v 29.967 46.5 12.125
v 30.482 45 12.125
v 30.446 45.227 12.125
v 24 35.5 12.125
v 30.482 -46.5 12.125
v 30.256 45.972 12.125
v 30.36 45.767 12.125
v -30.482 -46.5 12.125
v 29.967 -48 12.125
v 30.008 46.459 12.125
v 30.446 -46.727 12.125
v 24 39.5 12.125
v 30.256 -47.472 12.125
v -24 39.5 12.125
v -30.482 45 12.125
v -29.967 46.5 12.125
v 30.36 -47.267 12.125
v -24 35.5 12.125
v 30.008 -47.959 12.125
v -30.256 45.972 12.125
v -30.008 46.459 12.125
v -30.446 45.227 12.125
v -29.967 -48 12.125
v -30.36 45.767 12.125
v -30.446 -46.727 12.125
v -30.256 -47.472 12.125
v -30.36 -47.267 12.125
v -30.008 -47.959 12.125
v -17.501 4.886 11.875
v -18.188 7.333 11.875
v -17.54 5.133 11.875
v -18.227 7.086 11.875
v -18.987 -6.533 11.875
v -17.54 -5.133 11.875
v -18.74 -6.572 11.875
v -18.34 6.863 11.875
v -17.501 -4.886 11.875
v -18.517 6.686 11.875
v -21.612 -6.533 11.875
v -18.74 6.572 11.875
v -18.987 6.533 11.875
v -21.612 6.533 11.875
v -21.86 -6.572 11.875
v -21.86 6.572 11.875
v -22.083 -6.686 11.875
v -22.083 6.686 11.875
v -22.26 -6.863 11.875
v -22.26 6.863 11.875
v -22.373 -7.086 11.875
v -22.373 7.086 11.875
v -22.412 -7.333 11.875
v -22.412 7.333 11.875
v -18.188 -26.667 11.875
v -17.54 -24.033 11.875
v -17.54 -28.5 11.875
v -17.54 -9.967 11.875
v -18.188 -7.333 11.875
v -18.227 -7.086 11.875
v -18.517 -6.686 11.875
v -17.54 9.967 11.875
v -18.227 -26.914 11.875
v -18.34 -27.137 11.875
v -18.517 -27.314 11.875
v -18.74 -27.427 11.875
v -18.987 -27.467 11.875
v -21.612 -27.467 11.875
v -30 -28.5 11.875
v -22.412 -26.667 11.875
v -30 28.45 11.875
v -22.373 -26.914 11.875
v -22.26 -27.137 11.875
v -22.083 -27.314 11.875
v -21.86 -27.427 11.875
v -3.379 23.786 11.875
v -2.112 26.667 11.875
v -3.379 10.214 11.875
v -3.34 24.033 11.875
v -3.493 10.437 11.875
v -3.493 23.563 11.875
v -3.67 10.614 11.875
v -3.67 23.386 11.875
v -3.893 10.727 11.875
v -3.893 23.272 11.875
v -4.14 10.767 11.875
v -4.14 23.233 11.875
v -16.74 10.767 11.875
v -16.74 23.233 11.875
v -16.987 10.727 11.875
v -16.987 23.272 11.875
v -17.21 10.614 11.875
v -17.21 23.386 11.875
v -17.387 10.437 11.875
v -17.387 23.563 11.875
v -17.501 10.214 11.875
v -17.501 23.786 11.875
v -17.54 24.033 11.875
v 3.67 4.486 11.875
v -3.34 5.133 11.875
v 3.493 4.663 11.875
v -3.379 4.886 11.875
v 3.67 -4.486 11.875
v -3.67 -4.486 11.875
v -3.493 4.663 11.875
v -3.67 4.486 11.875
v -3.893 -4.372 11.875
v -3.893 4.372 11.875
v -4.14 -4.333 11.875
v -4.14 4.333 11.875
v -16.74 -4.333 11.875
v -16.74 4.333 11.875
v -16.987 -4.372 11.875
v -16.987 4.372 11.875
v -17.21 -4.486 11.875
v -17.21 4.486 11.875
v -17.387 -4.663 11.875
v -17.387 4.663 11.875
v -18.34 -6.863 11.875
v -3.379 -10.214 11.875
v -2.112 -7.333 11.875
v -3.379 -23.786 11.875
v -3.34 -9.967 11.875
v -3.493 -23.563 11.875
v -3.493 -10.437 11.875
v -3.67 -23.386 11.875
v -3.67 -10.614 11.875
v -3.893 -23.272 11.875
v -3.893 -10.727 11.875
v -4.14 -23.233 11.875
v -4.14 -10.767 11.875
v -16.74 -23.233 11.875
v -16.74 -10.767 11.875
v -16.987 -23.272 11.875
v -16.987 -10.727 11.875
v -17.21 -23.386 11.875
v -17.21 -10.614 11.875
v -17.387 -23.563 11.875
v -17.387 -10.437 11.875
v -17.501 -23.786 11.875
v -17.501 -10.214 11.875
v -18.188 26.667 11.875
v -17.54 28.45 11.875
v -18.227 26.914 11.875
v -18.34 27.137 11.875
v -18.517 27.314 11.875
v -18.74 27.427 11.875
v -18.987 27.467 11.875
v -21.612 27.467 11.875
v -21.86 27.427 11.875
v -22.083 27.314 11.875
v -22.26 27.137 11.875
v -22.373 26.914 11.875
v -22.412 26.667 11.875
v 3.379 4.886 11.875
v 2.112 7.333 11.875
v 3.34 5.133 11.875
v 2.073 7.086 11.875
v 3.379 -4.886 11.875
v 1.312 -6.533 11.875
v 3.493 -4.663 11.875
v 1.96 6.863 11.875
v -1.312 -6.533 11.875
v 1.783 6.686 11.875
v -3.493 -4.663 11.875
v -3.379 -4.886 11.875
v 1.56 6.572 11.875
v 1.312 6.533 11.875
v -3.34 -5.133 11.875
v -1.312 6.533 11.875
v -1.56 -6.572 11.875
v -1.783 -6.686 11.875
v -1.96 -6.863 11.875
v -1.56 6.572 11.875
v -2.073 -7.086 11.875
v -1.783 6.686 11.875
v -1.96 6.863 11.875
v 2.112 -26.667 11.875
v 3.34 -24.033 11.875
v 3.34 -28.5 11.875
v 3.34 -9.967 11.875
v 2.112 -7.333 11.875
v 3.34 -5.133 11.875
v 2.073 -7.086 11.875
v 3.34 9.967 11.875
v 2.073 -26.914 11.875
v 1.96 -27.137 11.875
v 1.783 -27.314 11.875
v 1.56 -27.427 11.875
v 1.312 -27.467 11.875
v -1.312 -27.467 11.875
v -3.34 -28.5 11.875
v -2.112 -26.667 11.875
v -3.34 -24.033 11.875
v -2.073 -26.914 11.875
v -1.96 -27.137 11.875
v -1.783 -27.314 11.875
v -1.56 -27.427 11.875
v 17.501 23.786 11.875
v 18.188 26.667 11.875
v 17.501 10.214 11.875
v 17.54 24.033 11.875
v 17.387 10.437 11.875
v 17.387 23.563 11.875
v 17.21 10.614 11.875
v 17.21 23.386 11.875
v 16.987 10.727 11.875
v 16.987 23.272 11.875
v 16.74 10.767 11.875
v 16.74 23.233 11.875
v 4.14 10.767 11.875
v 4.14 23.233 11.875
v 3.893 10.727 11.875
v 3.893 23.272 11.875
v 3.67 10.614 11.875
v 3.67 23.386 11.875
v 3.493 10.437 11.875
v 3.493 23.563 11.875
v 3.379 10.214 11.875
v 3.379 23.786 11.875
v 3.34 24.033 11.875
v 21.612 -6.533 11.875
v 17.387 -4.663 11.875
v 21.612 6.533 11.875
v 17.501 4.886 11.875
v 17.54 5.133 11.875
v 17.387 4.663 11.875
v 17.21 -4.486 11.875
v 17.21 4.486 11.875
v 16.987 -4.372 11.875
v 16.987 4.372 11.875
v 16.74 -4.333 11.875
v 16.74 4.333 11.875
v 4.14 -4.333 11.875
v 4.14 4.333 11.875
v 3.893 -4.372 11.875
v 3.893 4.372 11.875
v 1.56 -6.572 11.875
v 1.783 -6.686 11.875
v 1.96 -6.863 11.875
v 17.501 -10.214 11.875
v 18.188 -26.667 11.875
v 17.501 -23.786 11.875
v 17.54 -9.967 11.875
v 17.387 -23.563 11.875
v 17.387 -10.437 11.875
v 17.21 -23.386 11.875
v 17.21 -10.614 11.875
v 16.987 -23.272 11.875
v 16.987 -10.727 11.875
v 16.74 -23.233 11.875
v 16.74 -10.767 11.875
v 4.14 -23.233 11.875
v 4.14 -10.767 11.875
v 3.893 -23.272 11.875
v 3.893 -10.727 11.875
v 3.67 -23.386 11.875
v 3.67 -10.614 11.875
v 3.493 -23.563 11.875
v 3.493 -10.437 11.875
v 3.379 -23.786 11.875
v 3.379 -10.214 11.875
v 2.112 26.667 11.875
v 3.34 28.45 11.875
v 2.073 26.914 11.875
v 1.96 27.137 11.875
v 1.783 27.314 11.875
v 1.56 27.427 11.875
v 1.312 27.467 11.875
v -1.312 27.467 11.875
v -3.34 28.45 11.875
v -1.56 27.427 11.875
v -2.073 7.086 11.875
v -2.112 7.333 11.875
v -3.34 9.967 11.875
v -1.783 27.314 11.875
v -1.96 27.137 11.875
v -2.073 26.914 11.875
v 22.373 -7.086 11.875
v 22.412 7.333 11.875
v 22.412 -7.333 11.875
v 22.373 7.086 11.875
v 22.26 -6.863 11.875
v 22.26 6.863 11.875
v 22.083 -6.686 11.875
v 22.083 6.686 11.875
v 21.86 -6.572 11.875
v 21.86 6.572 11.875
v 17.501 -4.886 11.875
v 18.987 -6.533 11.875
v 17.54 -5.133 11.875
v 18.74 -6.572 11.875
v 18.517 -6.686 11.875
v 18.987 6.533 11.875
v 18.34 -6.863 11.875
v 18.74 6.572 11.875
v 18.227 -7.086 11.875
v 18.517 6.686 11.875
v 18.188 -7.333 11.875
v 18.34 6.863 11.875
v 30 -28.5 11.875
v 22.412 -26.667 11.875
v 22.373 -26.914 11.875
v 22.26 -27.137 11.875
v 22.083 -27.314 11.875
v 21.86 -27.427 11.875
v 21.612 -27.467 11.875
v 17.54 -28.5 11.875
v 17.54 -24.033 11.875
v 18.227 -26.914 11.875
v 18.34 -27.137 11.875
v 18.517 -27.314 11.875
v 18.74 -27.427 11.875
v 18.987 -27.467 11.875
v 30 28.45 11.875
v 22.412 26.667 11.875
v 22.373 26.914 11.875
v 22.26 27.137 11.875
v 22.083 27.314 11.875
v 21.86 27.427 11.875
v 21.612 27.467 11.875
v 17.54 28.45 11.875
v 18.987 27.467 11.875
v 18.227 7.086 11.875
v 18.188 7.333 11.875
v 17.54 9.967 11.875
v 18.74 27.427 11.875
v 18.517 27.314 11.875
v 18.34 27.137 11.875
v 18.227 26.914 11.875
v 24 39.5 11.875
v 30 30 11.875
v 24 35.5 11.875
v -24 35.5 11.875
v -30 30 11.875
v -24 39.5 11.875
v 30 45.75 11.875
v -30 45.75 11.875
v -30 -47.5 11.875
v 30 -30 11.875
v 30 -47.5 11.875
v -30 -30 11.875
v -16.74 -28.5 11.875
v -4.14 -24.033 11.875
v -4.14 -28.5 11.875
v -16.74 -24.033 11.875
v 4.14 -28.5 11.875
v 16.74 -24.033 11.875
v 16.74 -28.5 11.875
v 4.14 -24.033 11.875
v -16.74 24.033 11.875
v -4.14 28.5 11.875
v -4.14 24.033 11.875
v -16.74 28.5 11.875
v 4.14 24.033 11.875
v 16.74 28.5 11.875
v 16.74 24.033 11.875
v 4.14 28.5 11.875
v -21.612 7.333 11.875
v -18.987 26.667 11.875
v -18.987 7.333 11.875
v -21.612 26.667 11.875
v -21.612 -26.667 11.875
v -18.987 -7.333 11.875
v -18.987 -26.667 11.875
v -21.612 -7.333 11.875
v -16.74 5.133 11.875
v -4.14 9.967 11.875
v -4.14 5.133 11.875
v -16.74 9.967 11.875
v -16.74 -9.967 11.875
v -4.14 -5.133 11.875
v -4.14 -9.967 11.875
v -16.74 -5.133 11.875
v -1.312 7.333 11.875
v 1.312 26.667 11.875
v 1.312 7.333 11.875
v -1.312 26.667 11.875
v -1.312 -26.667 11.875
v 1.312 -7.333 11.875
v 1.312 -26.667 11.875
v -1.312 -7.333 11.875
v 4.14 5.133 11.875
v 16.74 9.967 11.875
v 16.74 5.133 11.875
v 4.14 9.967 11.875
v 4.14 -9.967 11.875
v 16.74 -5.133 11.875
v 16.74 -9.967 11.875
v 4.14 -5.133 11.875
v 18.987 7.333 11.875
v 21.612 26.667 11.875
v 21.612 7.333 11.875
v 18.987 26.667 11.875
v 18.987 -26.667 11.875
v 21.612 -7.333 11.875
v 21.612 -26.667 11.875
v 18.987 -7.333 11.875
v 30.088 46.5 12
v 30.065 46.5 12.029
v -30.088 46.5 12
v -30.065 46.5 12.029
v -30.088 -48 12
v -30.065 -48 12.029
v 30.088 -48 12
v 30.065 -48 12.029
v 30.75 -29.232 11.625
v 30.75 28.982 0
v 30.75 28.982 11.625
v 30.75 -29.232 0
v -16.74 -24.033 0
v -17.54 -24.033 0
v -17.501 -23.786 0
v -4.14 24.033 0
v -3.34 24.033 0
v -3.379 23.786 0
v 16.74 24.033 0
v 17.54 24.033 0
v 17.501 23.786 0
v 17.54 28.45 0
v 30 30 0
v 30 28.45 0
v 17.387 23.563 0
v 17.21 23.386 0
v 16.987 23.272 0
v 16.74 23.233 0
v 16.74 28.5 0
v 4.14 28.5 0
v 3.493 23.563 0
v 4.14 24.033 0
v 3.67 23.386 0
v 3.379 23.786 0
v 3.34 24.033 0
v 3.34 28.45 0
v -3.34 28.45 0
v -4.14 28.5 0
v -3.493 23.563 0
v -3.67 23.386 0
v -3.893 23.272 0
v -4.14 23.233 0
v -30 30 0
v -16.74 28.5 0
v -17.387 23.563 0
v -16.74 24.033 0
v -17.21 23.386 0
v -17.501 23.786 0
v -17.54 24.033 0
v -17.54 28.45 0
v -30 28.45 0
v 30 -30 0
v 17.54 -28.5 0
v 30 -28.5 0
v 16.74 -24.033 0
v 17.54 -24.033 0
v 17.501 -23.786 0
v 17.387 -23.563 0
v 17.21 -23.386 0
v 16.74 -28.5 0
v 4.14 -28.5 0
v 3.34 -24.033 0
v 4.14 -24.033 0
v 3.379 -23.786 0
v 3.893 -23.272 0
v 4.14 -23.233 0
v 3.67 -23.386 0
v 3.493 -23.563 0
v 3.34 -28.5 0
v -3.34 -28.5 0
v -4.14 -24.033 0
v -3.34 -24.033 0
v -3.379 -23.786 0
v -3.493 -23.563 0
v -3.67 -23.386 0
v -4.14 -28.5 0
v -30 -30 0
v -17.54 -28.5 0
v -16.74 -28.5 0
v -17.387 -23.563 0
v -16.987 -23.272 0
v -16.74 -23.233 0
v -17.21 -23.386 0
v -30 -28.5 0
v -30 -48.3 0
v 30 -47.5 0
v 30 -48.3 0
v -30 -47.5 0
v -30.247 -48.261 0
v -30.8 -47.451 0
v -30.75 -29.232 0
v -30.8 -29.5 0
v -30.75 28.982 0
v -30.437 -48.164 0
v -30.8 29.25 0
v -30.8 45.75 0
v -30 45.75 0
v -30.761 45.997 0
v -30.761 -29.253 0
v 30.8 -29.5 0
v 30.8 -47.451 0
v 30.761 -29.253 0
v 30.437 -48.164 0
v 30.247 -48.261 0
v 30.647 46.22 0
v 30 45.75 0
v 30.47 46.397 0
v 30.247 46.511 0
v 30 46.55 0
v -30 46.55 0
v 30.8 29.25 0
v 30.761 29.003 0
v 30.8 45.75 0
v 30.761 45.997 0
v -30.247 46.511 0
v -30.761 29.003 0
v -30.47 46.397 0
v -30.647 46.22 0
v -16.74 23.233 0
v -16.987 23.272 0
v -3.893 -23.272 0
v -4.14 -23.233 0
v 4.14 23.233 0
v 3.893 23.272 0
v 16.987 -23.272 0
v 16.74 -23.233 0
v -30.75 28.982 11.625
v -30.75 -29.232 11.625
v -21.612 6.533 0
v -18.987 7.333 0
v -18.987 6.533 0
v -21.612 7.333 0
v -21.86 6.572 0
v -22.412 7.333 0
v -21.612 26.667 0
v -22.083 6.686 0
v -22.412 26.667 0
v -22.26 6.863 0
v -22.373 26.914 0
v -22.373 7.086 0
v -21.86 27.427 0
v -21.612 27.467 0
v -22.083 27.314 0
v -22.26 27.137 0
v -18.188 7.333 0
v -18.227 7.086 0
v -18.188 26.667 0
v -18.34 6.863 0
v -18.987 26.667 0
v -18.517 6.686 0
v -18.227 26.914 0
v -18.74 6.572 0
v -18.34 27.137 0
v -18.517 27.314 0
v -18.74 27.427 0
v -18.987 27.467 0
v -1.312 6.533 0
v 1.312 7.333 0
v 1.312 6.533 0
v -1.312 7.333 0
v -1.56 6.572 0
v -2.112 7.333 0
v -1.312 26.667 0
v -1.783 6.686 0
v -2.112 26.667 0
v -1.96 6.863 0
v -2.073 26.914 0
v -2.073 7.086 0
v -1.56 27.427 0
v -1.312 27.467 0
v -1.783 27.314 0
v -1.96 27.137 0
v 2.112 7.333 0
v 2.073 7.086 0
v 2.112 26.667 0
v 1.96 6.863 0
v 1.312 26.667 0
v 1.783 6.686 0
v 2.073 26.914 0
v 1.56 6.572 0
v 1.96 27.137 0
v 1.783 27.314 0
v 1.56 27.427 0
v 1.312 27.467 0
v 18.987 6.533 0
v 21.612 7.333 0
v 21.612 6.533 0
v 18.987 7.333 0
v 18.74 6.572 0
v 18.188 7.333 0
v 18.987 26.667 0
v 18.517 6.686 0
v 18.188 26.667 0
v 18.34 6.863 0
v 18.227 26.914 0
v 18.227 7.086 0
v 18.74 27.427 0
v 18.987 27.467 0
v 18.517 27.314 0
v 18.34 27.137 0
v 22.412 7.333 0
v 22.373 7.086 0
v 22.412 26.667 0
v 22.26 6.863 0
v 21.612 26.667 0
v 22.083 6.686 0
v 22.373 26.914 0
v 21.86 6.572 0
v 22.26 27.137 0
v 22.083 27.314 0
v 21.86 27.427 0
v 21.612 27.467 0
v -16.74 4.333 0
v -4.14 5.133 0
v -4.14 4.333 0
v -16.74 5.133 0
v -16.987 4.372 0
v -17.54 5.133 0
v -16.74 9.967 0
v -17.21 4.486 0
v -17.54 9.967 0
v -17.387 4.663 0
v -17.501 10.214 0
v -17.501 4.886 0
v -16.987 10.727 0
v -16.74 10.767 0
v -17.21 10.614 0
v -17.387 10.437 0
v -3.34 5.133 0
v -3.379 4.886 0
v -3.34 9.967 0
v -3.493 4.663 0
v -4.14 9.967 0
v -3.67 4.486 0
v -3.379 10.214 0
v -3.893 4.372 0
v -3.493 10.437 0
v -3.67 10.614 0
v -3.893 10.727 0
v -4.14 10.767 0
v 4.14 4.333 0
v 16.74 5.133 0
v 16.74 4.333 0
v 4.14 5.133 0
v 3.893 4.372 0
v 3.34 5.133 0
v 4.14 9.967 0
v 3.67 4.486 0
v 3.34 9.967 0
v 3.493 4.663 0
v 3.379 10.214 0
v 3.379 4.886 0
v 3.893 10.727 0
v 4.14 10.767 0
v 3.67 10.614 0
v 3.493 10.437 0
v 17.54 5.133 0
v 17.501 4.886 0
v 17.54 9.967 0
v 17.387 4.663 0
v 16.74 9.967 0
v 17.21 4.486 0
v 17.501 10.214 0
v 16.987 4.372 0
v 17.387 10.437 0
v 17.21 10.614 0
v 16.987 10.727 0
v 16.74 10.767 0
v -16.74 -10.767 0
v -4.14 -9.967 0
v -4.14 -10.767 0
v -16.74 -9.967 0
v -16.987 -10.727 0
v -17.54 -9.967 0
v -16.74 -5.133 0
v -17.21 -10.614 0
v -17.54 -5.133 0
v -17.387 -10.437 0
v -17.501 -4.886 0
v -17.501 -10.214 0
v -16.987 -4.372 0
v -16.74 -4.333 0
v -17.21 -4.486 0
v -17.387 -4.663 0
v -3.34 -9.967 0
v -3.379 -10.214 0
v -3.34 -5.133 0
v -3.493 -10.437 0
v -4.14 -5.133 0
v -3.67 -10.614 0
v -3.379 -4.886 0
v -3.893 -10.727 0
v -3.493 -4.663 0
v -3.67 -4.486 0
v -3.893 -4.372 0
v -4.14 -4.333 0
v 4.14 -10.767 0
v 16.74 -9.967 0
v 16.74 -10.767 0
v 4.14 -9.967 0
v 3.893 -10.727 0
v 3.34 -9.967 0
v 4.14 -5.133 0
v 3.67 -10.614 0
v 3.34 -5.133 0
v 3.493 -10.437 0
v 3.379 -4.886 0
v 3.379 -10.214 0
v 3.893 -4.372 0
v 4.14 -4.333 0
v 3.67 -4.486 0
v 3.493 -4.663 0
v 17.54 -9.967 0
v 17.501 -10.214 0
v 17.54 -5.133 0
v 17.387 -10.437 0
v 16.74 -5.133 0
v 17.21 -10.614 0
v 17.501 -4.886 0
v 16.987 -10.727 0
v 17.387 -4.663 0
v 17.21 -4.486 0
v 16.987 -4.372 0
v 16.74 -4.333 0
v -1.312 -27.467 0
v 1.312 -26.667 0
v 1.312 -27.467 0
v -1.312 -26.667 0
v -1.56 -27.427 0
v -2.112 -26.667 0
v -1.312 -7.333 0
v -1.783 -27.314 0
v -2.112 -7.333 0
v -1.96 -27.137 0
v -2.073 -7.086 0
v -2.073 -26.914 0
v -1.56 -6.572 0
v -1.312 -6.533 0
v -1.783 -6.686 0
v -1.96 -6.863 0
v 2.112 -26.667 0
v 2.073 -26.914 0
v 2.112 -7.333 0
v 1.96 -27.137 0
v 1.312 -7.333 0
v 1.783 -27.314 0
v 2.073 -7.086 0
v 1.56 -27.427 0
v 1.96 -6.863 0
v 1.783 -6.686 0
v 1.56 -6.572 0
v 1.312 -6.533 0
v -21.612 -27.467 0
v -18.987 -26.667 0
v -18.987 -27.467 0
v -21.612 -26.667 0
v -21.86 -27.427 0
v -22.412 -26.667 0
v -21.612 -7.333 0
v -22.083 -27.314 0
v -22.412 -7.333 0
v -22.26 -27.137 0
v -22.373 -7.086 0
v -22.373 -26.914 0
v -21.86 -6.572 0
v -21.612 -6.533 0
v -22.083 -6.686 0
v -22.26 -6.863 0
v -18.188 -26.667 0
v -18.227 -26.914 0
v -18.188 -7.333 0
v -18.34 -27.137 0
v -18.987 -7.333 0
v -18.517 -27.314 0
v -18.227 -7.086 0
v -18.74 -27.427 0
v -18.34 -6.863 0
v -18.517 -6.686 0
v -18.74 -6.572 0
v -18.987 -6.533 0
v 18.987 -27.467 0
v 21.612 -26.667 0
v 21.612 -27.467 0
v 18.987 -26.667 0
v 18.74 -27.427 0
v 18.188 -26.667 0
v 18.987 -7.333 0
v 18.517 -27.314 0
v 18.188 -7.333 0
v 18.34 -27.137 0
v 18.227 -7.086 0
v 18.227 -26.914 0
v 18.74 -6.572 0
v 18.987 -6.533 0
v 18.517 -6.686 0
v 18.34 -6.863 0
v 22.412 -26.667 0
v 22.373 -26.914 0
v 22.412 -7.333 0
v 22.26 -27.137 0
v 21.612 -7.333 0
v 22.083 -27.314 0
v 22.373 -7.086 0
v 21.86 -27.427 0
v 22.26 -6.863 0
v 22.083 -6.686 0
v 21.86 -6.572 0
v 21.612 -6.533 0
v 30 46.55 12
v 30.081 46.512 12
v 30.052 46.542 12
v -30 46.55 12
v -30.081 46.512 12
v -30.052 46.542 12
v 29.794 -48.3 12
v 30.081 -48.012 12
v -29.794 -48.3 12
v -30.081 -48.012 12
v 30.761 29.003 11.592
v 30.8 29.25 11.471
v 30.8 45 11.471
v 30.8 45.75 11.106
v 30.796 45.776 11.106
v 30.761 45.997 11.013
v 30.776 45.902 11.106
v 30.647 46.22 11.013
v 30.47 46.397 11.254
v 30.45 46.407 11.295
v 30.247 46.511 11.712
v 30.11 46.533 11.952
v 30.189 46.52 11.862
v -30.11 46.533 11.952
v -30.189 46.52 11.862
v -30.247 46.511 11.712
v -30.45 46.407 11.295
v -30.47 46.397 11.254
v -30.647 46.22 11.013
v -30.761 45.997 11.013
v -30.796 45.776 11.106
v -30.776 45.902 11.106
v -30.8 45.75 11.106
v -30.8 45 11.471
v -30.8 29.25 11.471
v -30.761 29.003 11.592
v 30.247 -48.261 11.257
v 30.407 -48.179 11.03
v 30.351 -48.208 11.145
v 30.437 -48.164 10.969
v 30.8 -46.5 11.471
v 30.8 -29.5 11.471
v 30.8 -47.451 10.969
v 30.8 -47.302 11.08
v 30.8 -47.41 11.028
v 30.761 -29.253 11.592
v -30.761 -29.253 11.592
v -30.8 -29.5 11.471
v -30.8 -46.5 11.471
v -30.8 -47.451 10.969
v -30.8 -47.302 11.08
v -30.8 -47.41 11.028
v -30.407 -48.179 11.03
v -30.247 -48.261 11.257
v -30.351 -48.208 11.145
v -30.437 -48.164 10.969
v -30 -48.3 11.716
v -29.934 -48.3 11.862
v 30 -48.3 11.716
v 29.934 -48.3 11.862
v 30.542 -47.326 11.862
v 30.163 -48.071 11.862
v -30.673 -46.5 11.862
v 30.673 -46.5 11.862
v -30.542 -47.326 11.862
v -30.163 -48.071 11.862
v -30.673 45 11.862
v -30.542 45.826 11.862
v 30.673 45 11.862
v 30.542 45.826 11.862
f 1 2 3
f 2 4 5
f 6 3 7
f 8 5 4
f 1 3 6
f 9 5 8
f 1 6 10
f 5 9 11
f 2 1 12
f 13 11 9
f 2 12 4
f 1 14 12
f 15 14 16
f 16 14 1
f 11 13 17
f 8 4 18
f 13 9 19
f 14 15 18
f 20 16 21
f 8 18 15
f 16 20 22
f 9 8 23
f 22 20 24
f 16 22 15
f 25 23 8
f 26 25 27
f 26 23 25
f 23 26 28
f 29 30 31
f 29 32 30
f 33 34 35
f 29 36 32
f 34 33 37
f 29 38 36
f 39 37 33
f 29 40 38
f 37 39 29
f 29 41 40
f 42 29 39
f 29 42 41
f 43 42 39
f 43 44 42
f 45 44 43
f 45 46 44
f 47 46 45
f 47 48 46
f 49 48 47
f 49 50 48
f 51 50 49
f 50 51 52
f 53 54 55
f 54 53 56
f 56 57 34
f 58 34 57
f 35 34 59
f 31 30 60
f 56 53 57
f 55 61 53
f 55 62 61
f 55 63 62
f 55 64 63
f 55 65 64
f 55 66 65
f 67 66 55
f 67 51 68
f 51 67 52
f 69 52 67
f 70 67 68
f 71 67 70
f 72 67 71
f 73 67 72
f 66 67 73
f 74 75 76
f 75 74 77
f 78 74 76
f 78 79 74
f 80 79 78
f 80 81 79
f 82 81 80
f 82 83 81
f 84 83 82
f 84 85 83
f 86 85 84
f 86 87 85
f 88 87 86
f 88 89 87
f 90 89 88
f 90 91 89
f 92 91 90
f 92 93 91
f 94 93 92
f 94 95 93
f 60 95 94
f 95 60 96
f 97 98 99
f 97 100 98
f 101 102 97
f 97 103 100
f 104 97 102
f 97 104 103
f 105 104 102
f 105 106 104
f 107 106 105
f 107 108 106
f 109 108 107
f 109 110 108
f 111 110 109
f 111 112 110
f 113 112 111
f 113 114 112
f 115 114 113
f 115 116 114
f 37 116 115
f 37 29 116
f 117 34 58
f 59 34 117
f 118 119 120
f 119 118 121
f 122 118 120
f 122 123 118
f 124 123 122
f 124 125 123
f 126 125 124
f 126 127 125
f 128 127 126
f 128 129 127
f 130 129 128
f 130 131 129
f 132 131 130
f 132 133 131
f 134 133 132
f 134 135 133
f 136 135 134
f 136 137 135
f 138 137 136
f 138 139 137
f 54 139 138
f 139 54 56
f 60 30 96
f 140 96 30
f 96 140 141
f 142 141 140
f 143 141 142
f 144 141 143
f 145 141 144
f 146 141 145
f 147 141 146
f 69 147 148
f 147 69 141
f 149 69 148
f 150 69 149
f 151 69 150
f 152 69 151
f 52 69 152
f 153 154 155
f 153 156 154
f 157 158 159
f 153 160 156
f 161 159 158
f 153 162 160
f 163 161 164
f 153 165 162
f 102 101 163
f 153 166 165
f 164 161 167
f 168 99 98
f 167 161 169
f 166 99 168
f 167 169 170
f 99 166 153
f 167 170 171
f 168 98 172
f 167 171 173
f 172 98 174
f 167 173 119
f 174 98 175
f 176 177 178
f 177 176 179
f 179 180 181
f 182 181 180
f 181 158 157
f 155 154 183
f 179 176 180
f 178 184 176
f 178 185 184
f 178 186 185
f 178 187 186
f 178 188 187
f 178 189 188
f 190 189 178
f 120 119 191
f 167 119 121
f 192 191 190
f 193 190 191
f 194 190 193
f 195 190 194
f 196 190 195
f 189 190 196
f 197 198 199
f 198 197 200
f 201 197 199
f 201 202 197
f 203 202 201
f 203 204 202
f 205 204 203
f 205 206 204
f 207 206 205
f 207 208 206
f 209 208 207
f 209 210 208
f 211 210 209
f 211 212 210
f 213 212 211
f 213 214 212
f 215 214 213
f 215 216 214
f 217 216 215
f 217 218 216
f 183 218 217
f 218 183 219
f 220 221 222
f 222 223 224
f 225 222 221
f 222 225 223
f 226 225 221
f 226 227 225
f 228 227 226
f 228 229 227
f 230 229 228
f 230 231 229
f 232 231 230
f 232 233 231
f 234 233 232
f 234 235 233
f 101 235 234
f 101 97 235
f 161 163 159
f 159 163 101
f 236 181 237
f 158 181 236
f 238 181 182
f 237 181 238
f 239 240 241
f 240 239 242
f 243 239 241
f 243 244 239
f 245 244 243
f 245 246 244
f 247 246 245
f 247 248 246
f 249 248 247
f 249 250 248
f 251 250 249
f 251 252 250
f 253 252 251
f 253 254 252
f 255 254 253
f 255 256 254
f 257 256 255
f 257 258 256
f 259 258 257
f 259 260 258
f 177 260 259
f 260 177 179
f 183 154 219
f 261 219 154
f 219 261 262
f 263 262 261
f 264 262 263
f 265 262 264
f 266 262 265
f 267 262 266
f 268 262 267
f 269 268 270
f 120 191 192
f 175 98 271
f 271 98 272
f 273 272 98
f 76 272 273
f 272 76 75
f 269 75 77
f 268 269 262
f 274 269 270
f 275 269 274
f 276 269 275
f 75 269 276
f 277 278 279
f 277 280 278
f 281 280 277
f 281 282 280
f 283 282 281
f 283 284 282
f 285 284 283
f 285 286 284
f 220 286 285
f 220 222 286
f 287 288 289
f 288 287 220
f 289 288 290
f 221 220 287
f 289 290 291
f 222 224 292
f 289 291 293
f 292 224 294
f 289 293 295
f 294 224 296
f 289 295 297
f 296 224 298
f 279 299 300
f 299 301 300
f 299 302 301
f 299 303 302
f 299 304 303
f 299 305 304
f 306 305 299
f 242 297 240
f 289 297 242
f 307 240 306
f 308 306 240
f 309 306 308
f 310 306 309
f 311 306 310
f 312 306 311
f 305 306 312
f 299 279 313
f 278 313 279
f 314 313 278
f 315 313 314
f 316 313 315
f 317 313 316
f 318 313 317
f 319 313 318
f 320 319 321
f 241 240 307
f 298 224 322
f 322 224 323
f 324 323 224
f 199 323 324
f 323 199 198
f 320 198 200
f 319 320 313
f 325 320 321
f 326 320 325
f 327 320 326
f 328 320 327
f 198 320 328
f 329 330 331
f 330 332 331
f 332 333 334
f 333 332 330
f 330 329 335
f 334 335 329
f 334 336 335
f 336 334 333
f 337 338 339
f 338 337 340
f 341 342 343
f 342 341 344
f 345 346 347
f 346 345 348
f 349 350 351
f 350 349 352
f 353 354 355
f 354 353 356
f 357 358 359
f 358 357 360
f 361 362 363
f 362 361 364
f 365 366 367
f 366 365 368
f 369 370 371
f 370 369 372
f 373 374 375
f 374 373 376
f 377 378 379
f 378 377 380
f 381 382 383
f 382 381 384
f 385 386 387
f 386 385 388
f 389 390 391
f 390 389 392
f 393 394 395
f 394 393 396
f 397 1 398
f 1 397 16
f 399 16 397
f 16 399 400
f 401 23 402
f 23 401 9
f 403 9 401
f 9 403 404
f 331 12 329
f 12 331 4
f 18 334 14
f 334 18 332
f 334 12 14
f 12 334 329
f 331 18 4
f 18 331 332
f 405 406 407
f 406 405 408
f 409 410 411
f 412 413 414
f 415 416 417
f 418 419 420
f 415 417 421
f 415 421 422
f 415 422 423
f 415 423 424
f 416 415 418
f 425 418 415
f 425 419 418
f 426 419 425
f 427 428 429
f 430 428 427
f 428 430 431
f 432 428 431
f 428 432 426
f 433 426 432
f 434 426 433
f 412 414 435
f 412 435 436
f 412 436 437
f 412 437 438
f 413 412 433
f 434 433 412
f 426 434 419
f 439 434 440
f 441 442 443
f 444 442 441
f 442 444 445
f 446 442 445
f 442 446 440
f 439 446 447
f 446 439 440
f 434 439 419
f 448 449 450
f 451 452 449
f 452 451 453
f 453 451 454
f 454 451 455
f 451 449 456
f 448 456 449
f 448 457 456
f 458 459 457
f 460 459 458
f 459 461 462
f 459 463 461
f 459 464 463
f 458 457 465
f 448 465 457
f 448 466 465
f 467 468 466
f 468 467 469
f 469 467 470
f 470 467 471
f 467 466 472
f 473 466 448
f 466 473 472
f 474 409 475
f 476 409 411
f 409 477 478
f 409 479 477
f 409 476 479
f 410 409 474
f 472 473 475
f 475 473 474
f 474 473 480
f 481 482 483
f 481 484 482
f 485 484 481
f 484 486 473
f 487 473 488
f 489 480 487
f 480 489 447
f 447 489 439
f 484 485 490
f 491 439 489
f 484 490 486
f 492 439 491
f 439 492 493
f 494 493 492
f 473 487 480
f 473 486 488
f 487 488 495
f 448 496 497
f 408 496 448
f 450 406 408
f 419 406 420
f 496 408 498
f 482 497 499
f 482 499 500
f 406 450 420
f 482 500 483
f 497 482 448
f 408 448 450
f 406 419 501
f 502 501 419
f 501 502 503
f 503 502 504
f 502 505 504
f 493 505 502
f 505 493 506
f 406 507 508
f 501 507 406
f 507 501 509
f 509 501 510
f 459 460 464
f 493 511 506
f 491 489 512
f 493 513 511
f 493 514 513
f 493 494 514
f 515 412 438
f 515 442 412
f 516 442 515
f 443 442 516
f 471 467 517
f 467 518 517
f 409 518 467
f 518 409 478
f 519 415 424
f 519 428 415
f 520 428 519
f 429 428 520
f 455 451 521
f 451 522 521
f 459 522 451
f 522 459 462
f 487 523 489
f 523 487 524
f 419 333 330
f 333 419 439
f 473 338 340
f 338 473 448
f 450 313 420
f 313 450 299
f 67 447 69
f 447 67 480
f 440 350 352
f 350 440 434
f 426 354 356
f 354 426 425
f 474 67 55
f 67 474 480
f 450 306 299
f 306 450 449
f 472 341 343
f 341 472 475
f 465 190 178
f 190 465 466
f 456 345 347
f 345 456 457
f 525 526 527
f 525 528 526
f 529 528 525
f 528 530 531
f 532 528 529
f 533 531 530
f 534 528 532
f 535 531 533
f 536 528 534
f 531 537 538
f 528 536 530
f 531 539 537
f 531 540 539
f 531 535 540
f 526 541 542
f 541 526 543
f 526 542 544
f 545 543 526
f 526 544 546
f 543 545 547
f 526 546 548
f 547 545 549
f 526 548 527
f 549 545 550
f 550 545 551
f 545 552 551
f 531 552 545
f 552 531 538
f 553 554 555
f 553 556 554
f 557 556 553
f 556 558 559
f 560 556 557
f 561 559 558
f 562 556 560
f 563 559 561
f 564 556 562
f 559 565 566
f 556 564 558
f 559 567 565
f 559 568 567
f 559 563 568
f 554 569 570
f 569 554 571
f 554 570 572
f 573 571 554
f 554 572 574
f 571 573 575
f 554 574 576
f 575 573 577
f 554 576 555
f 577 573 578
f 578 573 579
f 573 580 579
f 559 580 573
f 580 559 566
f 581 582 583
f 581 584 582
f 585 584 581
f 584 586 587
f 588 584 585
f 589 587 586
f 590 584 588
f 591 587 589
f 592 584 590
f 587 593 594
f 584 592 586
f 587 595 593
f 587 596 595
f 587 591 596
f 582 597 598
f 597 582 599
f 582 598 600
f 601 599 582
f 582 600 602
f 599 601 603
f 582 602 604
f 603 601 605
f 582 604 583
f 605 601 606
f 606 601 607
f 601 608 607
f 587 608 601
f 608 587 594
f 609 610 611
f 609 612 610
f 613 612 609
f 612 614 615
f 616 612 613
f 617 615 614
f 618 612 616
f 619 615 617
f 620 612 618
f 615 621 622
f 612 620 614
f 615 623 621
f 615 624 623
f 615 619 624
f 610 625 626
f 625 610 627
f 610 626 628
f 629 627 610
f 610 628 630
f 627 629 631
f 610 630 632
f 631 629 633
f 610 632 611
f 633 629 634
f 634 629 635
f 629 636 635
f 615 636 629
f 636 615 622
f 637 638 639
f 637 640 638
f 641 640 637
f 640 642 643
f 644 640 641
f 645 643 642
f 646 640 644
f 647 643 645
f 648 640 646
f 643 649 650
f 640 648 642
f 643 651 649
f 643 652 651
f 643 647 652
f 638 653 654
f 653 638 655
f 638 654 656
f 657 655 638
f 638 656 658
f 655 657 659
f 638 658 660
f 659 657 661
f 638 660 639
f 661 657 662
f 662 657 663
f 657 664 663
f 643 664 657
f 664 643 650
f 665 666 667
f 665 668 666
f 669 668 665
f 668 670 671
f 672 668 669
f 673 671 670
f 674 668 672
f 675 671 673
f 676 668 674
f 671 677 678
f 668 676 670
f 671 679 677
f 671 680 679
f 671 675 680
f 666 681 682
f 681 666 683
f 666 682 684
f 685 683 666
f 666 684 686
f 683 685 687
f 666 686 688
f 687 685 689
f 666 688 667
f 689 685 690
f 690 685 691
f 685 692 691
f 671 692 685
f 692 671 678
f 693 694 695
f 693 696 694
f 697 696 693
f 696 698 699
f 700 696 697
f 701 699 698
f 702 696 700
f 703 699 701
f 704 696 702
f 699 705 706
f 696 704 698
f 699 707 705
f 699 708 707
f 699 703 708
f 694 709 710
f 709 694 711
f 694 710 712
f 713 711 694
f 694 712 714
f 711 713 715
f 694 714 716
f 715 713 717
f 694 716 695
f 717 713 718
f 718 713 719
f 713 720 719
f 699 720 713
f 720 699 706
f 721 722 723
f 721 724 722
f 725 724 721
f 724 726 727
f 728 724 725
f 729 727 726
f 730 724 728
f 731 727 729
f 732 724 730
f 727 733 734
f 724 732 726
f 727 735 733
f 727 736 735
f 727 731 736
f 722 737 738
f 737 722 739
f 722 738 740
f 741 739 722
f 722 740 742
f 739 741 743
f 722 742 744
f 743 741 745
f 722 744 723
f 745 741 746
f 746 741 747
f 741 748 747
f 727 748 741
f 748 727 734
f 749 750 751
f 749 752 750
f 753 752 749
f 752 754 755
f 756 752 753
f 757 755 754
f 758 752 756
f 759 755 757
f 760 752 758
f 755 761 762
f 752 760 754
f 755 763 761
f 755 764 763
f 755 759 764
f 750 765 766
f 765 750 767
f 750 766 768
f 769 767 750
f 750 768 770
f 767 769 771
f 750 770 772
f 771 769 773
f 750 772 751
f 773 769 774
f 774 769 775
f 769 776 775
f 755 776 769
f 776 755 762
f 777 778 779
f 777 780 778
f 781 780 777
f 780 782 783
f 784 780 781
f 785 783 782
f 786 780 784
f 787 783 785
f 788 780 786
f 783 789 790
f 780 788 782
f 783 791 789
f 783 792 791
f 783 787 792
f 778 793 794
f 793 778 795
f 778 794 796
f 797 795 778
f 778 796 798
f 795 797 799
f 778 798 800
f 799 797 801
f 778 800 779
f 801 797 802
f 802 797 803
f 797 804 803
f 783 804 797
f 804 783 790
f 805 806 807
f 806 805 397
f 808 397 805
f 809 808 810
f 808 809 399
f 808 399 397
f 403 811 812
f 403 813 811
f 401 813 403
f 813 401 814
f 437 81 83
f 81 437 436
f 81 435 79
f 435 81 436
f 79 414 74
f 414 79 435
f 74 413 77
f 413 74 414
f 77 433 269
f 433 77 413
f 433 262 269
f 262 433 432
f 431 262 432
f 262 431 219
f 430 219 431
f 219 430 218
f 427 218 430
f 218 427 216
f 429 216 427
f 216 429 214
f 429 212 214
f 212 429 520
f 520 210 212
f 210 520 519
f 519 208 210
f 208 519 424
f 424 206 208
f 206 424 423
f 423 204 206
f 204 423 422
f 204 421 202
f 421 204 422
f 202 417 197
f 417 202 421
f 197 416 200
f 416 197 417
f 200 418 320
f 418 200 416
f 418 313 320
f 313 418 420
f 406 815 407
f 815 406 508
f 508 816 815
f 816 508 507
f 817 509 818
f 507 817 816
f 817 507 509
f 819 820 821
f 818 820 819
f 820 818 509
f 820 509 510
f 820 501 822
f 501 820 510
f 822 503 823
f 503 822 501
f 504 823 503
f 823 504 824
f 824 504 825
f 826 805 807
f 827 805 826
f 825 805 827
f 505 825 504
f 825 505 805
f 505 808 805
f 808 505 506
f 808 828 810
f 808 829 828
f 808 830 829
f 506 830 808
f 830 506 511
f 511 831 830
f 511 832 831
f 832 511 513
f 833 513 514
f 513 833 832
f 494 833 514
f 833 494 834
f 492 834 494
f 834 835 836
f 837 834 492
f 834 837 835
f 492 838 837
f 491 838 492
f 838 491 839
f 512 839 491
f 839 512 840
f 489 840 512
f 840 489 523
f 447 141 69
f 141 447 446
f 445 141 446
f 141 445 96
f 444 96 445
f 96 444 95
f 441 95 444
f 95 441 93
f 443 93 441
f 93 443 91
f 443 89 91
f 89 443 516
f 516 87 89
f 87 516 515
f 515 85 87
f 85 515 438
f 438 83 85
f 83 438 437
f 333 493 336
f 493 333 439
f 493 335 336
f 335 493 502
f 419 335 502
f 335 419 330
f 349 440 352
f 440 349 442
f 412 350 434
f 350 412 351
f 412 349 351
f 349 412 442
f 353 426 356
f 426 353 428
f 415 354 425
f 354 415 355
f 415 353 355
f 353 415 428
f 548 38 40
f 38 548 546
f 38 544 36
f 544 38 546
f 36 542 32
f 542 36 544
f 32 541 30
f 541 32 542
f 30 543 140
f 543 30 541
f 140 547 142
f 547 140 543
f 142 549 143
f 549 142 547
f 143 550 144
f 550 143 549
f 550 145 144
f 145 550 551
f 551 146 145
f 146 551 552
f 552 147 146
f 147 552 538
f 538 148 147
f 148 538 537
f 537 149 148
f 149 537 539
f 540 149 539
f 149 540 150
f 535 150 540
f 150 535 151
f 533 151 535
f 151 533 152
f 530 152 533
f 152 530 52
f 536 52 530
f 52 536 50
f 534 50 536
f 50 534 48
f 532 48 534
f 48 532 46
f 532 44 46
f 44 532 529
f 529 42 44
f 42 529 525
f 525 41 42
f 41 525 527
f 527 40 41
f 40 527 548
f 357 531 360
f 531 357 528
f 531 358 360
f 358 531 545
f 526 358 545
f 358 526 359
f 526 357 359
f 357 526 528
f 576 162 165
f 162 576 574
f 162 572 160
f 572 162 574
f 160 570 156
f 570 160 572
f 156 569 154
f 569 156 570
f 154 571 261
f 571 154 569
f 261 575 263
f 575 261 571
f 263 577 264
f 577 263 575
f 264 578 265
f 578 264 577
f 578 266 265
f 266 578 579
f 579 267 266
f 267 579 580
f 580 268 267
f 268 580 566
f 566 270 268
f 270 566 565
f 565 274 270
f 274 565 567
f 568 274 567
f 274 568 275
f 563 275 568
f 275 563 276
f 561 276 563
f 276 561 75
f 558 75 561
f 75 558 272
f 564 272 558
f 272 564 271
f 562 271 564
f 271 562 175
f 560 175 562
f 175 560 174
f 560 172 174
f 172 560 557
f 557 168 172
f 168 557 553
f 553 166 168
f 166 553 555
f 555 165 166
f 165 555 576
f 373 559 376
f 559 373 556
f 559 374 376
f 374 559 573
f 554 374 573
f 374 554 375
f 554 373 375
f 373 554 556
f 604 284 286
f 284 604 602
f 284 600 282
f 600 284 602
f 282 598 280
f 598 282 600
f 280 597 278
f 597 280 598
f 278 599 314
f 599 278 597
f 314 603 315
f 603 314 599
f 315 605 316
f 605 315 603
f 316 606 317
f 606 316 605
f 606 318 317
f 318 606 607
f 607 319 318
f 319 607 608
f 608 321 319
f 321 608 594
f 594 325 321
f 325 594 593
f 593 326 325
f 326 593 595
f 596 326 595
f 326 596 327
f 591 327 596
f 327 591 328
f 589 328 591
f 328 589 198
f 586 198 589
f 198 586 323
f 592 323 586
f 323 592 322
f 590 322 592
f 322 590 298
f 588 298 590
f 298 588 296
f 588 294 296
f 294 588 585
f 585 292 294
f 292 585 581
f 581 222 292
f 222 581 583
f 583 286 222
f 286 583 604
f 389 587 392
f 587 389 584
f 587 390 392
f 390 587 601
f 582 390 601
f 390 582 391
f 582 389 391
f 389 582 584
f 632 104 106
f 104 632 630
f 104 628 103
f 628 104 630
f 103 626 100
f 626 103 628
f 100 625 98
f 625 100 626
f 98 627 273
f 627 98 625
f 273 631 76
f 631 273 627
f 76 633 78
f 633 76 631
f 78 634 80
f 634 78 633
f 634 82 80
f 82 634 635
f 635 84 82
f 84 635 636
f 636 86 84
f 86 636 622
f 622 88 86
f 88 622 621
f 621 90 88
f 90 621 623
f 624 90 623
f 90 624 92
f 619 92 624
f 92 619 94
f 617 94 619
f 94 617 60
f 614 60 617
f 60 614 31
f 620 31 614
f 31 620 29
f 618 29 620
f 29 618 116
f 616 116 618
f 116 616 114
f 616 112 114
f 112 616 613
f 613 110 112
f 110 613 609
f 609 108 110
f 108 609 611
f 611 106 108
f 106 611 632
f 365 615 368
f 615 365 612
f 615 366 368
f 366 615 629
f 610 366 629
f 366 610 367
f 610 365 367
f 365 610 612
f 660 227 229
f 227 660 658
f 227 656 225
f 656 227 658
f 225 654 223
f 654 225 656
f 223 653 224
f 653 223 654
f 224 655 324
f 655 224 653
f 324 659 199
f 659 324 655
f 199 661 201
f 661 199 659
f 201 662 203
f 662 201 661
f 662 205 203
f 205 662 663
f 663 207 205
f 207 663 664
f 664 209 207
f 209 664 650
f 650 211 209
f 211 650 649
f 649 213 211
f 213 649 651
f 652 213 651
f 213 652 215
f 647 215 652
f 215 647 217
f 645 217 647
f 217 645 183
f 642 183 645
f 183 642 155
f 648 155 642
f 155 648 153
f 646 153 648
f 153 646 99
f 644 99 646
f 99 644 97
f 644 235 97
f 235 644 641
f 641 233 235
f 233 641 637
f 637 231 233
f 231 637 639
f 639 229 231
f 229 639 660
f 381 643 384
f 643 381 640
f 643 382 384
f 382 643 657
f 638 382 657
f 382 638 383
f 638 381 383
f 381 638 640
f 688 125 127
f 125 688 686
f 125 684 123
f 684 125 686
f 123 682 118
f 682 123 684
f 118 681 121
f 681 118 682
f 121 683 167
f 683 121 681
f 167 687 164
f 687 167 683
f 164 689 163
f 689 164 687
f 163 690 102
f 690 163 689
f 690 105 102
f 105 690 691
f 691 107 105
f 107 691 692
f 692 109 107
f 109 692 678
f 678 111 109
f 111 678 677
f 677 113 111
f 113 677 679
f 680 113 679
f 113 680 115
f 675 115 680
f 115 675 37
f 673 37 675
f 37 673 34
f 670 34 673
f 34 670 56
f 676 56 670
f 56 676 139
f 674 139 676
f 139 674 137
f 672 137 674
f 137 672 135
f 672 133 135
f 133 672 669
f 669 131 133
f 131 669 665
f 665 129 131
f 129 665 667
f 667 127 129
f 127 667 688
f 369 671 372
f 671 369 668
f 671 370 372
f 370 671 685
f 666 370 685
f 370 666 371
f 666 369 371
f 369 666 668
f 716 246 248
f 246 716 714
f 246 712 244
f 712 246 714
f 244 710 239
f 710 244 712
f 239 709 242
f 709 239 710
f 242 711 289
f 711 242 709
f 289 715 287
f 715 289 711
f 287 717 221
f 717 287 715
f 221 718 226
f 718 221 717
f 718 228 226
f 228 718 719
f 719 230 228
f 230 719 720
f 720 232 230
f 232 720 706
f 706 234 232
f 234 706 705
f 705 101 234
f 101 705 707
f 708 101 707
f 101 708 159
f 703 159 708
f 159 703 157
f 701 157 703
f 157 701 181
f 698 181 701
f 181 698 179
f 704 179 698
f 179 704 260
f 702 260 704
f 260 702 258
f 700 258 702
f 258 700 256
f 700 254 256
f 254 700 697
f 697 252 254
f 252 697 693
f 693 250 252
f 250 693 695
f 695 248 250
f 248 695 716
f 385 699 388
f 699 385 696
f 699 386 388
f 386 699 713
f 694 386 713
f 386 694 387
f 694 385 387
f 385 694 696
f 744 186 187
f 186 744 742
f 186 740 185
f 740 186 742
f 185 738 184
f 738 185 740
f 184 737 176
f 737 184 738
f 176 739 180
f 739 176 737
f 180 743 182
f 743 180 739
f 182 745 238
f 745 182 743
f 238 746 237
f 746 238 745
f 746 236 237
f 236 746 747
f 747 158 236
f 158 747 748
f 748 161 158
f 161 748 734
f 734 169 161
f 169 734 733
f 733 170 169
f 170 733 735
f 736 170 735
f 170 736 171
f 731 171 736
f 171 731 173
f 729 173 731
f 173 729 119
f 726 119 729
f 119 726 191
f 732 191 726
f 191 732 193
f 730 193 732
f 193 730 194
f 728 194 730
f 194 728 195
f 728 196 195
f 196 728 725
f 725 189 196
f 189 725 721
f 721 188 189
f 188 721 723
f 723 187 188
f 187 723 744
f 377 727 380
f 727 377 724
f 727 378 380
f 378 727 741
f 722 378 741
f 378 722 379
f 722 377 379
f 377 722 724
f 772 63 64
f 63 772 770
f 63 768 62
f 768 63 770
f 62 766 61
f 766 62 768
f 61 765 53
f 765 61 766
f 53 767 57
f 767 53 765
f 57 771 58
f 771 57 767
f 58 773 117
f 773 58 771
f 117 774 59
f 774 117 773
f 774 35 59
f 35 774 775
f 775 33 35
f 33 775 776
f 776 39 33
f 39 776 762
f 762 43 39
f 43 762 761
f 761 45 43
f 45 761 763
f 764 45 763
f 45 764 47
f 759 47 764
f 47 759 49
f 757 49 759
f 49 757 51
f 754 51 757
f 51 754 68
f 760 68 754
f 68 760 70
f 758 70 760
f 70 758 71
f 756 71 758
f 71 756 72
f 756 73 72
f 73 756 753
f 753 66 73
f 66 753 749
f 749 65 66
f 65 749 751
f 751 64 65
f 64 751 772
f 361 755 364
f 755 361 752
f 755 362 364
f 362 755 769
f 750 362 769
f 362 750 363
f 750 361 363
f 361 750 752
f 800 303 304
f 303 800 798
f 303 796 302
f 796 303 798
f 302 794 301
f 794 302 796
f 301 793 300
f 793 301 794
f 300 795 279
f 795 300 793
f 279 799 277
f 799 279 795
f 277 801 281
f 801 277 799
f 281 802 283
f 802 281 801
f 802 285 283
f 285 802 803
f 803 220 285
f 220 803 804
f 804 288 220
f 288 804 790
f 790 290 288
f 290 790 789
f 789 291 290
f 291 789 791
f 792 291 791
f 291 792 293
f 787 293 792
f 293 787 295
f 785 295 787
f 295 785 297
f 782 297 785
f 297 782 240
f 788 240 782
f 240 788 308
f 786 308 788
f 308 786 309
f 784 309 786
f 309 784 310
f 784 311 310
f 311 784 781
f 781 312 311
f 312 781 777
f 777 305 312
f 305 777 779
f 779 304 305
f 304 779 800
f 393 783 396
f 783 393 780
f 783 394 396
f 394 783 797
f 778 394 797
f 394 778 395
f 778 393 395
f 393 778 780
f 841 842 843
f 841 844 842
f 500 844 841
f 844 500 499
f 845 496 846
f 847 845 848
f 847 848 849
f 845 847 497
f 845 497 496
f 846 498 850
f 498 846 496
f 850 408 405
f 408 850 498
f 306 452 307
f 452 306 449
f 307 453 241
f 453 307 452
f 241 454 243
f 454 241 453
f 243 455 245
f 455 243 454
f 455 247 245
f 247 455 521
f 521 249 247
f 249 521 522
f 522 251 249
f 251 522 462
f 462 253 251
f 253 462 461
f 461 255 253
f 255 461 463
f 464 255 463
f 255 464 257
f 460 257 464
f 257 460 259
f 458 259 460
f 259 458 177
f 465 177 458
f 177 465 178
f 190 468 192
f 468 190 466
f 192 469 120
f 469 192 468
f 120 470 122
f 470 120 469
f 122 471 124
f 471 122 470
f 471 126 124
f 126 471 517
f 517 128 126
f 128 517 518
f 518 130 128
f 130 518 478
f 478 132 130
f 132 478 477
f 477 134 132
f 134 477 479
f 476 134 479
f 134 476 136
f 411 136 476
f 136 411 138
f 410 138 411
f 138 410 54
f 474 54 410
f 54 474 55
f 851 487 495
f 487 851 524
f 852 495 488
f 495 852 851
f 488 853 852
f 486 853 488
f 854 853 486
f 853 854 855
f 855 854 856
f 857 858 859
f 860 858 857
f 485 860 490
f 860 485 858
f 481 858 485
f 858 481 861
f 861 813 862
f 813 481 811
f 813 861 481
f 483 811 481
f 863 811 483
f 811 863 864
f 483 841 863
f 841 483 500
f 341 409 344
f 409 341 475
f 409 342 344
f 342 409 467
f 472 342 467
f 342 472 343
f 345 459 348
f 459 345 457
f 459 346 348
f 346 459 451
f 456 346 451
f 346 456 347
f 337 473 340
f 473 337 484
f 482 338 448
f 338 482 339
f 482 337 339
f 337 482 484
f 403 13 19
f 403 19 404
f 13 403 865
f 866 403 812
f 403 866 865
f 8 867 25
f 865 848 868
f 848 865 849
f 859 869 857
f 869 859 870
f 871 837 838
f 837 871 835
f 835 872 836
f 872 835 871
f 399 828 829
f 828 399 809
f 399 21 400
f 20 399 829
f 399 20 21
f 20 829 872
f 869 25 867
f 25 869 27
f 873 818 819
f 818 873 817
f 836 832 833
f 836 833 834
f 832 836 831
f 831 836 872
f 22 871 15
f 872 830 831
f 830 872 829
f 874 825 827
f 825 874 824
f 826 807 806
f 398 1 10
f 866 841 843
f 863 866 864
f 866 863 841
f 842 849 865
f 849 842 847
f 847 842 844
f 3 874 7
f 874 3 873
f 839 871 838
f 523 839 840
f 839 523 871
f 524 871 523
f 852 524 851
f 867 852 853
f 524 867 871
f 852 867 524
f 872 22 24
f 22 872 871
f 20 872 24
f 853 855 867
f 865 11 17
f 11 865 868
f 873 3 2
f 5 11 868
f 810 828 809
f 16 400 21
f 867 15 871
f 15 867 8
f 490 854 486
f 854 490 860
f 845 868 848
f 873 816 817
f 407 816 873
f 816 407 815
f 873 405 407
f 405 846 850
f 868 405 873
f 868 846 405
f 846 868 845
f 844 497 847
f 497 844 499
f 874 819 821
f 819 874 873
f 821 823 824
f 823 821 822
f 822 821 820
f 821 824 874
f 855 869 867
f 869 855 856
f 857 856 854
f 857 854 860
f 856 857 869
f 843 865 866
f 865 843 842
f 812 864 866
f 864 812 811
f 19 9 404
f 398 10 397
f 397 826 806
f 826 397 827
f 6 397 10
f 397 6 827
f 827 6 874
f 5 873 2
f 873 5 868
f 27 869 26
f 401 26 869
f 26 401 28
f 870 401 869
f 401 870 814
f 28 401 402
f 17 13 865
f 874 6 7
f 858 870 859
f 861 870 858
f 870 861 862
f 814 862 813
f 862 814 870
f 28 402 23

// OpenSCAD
//pinner 0 - 13 og GND på enne siden
//A5 analog inngang på den andre
pinneavstand=2.54;
pinnebredde=0.9;
pinnehoyde=11;
pad=1.1;
hullradius=0.4;
sjusegmentlengde=75-18;
sjusegmentbredde=53;
pothoyde=5;
potradius=7.5;
rund=3;
$fn=20;

deksel();
//2D();

module deksel(){
intersection(){
minkowski(){
    translate([0,+16.5/2-18/2,0])cube([62-rund*2,sjusegmentlengde+16.5+18,24-rund],center=true);
    sphere(rund);
}
union(){
linear_extrude(12)
difference(){
minkowski(){
    2D();
    circle(0.8);
}
2D();
}
difference(){
translate([0,+16.5/2-18/2,12])cube([62,sjusegmentlengde+3+16.5+18,0.25],center=true);
    

translate([0,37.5,0])cube([48,4,30],center=true);
    }
translate([0,0,6])difference(){
        cube([61.5,sjusegmentlengde+3,12.0],center=true);
        cube([60,sjusegmentlengde,13],center=true);
    
    }
}
}
}
module 2D(){
projection(){
translate([0,0,0])   
    
    translate([0,-17,-2])tall(sjusegmentbredde+5,sjusegmentlengde/2+3);
    translate([0,17,-2])tall(sjusegmentbredde+5,sjusegmentlengde/2+3);
    translate([0,37.5,0])cube([60,16.5,18],center=true);
    translate([0,-38.5,0])cube([60,18,18],center=true);
}
}
module 7seg(x,b){   
    difference(){
     translate([0,0,-2.5])color("white")cube([x,b,pothoyde+5],center=true);
   for (k=[-2*pinneavstand:pinneavstand:2*pinneavstand]){
    for (l=[-1:2:1]){  
          translate([l*((x/2)-1),k,-5])pinne();   
              }}
              translate([0,0,-0.75])tall(x,b);
              LED(x,b);             
              banerkatode(-3.5);
         translate([0,0,-6.5])color("red")cube([x*0.9,b*0.9,7],center=true);
              }              
          }              
module tall (h,l){
    for (i=[-1:1:1]){
        translate([i*h*0.35,0,2])cube([l/12,h/3,2.12],center=true);
    }
    for (j=[-1:2:1]){
        for (k=[-1:2:1]){
        translate([j*h*0.18,k*l*0.3,2])cube([l/2.5,h/12,2.12],center=true);
    }
}
}
